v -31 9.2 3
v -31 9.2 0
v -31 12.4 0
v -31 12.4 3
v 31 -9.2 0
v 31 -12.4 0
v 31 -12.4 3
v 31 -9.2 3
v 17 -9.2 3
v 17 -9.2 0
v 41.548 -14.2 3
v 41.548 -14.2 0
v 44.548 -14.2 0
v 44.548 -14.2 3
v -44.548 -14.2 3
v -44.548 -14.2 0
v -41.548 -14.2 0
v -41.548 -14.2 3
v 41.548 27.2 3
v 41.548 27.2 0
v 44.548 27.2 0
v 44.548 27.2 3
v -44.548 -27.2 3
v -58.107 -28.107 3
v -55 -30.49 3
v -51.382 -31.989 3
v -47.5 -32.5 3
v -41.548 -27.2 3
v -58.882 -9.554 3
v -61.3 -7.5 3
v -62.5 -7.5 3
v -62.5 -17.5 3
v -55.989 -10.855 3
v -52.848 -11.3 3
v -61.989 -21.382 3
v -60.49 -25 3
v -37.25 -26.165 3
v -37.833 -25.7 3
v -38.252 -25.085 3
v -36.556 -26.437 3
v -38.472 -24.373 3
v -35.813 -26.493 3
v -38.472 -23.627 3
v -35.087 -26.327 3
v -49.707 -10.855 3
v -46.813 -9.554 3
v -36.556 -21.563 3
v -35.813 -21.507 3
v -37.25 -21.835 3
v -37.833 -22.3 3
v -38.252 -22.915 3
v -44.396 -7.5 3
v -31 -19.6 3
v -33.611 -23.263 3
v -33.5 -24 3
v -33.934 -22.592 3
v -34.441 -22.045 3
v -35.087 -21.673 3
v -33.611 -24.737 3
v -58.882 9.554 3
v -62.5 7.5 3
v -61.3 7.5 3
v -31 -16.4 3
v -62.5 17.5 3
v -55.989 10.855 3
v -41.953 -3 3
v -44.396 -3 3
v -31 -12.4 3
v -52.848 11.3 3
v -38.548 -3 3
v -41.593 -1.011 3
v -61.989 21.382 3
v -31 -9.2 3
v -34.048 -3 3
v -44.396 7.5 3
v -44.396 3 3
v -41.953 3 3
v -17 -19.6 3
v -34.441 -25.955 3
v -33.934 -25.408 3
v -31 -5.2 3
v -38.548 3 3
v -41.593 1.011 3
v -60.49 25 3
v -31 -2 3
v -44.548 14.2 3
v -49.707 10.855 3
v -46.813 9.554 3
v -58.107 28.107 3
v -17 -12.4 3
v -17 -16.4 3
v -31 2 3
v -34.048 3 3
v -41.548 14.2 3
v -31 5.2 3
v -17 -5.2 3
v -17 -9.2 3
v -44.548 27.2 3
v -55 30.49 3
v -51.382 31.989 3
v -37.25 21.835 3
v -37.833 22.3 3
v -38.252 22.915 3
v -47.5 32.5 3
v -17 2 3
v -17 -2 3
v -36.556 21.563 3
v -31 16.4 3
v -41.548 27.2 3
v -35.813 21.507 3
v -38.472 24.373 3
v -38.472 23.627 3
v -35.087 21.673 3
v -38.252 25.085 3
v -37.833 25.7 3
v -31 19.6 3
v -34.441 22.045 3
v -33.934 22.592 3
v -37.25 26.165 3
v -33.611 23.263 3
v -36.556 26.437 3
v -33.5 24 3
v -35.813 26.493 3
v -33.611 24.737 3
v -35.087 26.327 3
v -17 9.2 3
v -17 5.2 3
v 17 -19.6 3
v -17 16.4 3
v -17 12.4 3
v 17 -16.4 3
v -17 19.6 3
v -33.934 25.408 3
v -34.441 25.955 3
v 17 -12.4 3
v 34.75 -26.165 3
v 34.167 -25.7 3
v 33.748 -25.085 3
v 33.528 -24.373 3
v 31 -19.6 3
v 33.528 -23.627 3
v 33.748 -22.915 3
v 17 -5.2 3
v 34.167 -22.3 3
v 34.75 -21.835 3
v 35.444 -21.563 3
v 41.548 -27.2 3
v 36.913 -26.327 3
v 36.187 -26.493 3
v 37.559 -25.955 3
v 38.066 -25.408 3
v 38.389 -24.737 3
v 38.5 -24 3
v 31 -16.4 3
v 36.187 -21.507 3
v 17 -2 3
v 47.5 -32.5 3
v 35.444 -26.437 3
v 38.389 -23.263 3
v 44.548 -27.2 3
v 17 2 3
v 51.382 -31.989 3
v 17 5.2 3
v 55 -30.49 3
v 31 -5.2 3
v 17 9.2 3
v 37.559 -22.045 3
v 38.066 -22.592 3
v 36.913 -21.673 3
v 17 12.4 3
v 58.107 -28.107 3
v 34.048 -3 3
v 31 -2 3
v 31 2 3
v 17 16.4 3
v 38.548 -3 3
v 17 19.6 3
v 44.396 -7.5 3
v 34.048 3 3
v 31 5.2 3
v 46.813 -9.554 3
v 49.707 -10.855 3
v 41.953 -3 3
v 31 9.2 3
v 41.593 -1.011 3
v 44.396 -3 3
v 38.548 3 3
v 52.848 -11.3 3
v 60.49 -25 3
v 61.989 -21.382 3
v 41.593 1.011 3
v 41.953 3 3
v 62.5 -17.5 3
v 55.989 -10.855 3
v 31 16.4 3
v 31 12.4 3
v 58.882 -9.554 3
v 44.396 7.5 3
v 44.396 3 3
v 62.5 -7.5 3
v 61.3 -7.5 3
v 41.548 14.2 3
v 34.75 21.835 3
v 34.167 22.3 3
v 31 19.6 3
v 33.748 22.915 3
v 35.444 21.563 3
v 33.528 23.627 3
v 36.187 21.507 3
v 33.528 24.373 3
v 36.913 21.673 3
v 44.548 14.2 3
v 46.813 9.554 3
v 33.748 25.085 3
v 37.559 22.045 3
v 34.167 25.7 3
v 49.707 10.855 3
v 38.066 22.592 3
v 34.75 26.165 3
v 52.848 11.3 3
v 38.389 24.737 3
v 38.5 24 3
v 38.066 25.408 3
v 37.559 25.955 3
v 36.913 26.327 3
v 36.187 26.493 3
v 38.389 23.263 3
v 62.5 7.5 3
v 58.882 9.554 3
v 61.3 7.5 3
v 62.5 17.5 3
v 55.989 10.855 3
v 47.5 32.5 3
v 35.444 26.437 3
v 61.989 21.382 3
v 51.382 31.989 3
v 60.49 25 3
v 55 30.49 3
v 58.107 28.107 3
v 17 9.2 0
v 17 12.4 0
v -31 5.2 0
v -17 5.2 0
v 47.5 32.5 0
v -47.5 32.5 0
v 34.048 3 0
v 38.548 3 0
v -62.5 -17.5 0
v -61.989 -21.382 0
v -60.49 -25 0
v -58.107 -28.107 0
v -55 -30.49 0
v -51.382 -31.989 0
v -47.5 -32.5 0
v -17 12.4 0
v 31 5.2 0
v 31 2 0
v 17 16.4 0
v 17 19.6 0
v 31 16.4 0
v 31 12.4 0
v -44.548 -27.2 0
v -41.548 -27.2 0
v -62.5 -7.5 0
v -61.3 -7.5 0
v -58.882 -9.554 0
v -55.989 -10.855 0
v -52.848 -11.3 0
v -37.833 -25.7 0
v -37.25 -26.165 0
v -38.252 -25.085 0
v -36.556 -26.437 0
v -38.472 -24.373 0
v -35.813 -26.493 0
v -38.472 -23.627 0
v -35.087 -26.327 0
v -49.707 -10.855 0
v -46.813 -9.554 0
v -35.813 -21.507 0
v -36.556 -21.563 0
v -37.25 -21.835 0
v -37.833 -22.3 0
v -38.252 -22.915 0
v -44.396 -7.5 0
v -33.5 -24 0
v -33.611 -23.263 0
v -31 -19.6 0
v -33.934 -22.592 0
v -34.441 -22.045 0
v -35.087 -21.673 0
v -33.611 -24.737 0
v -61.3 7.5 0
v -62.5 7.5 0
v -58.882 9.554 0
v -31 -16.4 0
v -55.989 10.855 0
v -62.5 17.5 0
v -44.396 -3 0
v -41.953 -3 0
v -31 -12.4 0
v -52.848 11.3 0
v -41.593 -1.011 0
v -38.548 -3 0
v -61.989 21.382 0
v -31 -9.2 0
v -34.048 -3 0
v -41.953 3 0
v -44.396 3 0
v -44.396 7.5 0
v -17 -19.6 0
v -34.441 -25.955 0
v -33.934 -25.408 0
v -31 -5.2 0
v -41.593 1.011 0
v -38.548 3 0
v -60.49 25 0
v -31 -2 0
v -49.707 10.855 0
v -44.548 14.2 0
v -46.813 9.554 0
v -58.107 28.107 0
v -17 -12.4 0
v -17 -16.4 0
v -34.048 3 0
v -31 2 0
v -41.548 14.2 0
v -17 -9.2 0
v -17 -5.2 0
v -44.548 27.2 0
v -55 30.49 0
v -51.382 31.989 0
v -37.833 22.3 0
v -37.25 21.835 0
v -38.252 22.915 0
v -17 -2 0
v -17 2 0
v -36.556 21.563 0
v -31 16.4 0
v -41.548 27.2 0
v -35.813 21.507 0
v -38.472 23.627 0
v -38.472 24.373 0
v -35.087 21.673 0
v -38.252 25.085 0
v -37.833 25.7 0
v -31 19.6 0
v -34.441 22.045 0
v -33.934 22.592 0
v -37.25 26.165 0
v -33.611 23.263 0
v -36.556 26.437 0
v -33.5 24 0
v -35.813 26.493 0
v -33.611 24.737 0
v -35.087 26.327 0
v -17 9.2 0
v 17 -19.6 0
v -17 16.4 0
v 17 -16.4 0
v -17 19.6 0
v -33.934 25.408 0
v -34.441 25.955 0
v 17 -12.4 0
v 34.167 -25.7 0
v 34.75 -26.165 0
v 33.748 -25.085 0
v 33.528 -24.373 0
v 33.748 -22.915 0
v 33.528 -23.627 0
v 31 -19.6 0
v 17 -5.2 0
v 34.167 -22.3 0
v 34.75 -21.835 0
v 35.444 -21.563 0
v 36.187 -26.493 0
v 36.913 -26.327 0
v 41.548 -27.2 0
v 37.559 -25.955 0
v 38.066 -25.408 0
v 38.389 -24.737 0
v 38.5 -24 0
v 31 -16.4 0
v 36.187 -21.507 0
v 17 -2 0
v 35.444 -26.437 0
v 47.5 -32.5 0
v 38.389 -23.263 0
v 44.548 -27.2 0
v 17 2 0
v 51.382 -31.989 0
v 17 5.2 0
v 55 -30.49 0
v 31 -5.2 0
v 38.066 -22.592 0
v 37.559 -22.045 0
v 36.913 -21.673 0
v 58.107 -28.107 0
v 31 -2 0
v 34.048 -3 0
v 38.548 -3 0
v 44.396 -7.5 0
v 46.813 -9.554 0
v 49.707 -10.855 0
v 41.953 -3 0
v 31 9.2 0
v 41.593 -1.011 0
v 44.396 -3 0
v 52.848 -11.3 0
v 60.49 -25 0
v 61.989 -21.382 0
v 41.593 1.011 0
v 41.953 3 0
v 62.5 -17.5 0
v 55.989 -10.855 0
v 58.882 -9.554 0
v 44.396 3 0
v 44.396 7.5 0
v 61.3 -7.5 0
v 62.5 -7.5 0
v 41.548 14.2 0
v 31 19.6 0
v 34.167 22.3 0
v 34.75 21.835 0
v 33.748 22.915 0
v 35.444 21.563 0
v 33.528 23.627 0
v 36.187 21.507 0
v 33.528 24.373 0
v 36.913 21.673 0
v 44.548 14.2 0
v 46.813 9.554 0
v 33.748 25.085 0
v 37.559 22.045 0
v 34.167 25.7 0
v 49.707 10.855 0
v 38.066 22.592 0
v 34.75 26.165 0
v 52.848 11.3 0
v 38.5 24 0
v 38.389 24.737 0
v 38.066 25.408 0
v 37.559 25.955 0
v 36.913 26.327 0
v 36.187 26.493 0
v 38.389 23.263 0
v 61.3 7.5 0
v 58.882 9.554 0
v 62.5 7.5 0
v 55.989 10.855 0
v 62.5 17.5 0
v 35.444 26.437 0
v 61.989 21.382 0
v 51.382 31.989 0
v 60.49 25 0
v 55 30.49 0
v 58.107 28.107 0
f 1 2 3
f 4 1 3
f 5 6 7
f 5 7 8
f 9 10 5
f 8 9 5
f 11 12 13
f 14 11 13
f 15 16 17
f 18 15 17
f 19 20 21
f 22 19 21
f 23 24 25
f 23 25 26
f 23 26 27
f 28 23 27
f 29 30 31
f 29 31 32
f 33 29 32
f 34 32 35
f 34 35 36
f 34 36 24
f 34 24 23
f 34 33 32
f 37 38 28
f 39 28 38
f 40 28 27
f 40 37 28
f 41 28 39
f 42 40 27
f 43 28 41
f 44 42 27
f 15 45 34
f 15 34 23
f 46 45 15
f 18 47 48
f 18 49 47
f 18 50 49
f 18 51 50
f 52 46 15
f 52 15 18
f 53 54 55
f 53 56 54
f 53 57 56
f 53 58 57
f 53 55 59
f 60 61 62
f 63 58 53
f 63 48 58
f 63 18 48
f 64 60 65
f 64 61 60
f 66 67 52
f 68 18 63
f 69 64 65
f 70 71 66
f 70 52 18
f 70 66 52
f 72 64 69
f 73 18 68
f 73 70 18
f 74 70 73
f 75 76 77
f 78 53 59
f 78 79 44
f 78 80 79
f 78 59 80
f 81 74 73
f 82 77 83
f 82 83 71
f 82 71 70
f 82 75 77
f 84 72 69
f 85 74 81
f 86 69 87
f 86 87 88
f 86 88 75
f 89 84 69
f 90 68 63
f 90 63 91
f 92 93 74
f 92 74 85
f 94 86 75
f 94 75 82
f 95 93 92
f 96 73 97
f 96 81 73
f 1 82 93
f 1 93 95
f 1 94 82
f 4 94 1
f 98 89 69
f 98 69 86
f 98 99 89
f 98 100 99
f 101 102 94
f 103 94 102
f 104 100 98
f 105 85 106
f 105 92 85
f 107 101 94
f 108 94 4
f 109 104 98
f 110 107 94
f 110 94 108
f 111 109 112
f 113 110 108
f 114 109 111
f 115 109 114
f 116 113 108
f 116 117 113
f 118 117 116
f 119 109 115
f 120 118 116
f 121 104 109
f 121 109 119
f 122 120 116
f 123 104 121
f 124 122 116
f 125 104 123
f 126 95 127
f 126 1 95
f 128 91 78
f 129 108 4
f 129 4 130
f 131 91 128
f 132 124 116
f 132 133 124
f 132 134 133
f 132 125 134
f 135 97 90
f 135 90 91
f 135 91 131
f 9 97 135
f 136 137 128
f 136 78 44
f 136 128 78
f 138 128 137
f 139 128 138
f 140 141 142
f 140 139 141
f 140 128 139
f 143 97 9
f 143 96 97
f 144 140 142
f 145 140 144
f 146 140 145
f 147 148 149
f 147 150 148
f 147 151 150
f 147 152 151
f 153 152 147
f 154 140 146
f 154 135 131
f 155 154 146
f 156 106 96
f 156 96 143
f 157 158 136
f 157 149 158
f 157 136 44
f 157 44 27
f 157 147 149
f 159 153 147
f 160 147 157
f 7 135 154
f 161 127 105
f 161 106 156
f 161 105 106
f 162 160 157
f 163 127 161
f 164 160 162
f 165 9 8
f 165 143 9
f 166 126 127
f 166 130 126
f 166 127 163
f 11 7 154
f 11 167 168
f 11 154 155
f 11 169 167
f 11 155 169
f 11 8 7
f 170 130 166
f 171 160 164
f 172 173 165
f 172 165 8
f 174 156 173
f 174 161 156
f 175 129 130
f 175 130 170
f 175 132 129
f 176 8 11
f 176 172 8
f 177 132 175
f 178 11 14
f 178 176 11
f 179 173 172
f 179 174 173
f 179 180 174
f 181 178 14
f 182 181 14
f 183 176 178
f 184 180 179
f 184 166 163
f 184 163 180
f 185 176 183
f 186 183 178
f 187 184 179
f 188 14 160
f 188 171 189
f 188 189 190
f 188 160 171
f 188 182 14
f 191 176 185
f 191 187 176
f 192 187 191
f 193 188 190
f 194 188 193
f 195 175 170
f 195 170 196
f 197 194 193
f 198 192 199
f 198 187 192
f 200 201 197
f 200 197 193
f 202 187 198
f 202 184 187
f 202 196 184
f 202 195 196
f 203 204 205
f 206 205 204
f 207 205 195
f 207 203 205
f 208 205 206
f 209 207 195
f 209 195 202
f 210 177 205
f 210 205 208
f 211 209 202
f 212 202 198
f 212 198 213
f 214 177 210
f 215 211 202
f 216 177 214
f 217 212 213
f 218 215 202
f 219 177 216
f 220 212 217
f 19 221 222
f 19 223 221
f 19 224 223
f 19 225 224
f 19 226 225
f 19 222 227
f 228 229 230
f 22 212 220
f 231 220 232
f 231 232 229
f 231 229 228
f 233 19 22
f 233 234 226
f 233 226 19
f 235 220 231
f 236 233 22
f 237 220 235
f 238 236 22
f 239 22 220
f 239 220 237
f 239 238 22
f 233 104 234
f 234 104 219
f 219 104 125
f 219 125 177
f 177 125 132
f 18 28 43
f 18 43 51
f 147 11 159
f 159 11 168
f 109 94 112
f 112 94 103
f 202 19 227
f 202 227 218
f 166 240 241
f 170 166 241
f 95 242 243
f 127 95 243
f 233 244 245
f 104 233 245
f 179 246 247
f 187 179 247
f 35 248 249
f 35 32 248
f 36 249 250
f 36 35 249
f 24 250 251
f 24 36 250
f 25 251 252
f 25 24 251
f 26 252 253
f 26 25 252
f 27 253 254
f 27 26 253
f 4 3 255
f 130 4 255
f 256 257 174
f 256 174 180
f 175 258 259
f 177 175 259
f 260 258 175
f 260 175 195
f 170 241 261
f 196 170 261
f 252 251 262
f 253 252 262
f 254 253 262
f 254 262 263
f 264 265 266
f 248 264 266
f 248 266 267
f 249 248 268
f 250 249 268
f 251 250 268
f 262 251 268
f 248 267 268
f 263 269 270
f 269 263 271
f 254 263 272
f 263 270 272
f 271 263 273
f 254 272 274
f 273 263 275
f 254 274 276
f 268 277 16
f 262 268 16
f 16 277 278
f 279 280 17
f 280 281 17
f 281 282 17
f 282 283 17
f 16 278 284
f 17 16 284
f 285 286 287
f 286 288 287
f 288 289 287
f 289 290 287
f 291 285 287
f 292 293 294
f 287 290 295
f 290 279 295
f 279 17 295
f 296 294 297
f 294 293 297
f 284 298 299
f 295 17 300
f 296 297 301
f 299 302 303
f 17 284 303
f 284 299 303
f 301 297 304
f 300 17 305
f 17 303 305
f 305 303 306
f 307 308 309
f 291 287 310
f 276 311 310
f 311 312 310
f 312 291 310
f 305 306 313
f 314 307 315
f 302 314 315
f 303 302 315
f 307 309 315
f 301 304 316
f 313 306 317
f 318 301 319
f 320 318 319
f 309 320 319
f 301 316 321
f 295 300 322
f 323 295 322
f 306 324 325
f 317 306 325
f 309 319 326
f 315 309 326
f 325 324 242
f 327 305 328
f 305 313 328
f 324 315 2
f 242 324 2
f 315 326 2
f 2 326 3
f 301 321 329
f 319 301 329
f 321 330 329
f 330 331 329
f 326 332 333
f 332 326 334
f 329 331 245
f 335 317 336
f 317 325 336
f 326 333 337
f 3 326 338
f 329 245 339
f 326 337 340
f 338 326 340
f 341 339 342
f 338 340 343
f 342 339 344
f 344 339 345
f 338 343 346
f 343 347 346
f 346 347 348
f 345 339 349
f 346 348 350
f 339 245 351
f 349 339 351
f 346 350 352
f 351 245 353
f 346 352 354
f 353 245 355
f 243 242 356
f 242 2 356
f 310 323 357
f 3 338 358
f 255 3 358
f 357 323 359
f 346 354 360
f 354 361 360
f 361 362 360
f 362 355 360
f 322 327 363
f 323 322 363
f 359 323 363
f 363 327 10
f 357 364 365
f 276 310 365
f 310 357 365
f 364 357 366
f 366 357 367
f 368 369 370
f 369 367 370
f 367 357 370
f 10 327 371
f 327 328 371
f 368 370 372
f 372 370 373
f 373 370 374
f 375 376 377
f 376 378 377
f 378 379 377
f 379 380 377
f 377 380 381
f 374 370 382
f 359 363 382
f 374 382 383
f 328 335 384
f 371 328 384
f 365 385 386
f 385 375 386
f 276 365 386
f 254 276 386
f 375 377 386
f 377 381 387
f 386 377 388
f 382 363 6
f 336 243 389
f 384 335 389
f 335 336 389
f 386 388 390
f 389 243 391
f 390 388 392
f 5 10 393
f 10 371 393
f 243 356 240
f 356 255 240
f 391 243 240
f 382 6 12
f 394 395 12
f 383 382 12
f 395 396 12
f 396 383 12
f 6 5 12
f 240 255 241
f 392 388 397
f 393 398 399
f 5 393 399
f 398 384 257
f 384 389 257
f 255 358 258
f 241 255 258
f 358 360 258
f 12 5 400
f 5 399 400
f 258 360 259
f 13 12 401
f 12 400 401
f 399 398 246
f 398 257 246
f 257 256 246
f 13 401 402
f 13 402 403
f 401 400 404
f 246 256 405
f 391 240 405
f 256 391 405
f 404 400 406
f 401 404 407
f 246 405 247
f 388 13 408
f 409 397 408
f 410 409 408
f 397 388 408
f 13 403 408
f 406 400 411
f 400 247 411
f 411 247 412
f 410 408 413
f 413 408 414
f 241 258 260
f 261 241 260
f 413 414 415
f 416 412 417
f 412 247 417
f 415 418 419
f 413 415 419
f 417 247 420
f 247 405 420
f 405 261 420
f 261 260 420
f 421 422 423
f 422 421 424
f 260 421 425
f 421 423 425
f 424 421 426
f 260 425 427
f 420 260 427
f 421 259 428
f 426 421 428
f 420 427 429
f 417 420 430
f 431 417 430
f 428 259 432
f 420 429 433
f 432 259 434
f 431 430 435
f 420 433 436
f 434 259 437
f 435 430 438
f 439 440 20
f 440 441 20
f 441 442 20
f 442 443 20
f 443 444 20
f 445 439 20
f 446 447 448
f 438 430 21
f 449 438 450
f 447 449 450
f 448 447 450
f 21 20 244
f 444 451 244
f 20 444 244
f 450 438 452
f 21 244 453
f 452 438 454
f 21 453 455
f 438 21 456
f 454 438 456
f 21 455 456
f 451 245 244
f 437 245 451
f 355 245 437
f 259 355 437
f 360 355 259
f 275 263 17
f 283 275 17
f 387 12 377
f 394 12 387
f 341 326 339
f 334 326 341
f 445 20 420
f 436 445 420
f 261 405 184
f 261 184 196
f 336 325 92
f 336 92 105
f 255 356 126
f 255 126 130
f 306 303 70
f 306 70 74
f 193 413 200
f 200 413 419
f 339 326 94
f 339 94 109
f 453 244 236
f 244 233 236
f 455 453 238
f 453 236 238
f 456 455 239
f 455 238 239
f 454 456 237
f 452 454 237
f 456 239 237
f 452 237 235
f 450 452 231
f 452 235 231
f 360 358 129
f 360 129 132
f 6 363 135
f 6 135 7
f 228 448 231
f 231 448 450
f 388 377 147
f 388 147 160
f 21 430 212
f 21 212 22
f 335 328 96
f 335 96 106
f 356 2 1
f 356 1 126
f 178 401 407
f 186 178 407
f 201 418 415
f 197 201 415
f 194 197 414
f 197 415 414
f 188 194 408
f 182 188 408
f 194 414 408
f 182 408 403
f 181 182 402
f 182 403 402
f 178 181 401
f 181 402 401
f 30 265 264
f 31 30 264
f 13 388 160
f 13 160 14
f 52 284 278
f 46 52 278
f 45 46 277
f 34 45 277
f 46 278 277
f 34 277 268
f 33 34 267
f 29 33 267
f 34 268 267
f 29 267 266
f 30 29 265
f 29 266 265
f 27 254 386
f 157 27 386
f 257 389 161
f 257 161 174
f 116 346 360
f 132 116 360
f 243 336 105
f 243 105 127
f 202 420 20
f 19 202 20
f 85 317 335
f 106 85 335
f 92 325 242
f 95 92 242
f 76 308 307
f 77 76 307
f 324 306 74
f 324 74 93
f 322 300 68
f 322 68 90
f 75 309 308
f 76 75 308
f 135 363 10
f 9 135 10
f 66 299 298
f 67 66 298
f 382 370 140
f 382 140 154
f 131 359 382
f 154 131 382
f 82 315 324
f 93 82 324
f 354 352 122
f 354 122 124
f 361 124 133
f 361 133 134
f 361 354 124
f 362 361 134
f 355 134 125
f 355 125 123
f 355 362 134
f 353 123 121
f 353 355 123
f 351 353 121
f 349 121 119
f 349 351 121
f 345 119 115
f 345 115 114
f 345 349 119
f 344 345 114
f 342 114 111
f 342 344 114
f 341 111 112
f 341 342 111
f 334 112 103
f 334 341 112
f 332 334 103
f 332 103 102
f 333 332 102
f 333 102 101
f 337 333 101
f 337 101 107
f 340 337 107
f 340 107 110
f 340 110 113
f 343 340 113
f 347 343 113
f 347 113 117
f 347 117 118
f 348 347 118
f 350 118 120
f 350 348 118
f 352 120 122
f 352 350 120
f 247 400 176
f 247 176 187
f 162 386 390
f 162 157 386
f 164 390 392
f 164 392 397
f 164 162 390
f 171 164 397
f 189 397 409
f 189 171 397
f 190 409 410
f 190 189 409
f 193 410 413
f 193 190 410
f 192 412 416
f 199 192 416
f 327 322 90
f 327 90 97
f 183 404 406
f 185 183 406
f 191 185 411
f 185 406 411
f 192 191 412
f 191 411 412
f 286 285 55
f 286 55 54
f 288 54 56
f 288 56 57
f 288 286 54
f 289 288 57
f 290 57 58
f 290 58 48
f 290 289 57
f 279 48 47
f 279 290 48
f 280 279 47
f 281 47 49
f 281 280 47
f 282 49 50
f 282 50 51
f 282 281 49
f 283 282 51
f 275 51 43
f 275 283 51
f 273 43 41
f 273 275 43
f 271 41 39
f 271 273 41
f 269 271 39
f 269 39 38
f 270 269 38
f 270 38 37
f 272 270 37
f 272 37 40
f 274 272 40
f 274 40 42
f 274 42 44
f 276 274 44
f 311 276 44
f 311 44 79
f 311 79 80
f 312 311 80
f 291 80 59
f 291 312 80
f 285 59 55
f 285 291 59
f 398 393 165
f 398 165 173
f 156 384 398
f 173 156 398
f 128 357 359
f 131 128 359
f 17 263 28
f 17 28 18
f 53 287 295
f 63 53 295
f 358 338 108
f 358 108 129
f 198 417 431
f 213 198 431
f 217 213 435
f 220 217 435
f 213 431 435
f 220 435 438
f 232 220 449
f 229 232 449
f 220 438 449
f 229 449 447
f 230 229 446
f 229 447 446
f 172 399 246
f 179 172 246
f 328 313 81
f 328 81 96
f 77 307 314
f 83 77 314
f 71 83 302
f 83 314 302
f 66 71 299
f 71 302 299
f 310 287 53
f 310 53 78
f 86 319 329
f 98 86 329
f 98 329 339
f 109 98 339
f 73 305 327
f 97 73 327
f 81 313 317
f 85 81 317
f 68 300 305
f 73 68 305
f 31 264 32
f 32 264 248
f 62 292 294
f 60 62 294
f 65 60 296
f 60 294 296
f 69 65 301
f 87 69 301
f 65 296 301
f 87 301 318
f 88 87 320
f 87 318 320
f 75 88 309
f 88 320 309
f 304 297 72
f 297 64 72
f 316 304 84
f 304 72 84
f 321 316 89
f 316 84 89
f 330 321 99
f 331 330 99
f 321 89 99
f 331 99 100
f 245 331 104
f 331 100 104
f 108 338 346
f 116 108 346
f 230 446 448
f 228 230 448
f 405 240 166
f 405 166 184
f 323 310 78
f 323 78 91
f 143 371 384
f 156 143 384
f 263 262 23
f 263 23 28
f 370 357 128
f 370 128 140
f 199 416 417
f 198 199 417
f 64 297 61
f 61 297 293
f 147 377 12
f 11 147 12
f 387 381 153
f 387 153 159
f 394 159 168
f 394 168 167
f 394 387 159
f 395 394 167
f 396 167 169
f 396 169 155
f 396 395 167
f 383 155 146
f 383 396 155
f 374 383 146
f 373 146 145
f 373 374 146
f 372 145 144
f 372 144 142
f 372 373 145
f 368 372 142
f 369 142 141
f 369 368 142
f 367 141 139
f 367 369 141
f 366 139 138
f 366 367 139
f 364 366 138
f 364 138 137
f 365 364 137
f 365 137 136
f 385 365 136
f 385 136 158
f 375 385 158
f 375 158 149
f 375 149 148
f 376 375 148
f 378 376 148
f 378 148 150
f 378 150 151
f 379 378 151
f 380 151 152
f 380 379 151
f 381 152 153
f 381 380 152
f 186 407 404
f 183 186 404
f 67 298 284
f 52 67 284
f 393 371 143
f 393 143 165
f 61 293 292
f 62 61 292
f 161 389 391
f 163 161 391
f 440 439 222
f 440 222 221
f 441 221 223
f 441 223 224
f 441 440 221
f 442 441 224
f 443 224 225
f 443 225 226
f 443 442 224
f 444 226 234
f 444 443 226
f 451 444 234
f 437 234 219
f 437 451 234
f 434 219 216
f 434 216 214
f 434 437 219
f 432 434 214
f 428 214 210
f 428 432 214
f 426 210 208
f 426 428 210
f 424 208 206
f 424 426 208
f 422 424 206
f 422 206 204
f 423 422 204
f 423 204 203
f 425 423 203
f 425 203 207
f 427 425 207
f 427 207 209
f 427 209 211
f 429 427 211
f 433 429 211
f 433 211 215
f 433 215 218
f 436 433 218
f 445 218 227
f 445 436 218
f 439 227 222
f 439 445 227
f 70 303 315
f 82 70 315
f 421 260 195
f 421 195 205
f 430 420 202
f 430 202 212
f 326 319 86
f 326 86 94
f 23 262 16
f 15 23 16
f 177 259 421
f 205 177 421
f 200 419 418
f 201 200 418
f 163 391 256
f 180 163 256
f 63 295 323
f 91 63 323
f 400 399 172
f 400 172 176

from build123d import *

# Parameters (mm, degrees)
SKICA2_R                = 2.5
SKICA2_W                = 4.5
SKICA2_H                = 6
SKICA2_W_2              = 3
SKICA2_H_2              = 13
SKICA2_W_3              = 14
SKICA2_H_3              = 3.2
P_IDAT_VYSUNUT_M1_DEPTH = 3
ZAOBLIT1_R              = 15


with BuildPart() as part:
    # Skica2 → Přidat vysunutím1 (new body)
    with BuildSketch(Plane.XY):
        with BuildLine():
            Line((-62.5, 7.5), (-61.3, 7.5))
            ThreePointArc((-61.3, 7.5), (-52.847781356, 11.3), (-44.395562713, 7.5))
            Line((-44.395562713, 7.5), (-44.395562713, 3))
            Line((-44.395562713, 3), (-41.953287334, 3))
            ThreePointArc((-41.953287334, 3), (-41.547781356, 0), (-41.953287334, -3))
            Line((-41.953287334, -3), (-44.395562713, -3))
            Line((-44.395562713, -3), (-44.395562713, -7.5))
            ThreePointArc((-44.395562713, -7.5), (-52.847781356, -11.3), (-61.3, -7.5))
            Line((-61.3, -7.5), (-62.5, -7.5))
            Line((-62.5, -7.5), (-62.5, -32.5))
            Line((-62.5, -32.5), (62.5, -32.5))
            Line((62.5, -32.5), (62.5, -7.5))
            Line((62.5, -7.5), (61.3, -7.5))
            ThreePointArc((61.3, -7.5), (52.847781356, -11.3), (44.395562713, -7.5))
            Line((44.395562713, -7.5), (44.395562713, -3))
            Line((44.395562713, -3), (41.953287334, -3))
            ThreePointArc((41.953287334, -3), (41.547781356, 0), (41.953287334, 3))
            Line((41.953287334, 3), (44.395562713, 3))
            Line((44.395562713, 3), (44.395562713, 7.5))
            ThreePointArc((44.395562713, 7.5), (52.847781356, 11.3), (61.3, 7.5))
            Line((61.3, 7.5), (62.5, 7.5))
            Line((62.5, 7.5), (62.5, 32.5))
            Line((62.5, 32.5), (-62.5, 32.5))
            Line((-62.5, 32.5), (-62.5, 7.5))
        make_face()
        with Locations((-36, 24)):
            Circle(SKICA2_R, mode=Mode.SUBTRACT)
        with Locations((36, 24)):
            Circle(SKICA2_R, mode=Mode.SUBTRACT)
        with Locations((-36, -24)):
            Circle(SKICA2_R, mode=Mode.SUBTRACT)
        with Locations((36, -24)):
            Circle(SKICA2_R, mode=Mode.SUBTRACT)
        with Locations((-36.297781356, 0)):
            Rectangle(SKICA2_W, SKICA2_H, mode=Mode.SUBTRACT)
        with Locations((-43.047781356, -20.7)):
            Rectangle(SKICA2_W_2, SKICA2_H_2, mode=Mode.SUBTRACT)
        with Locations((-43.047781356, 20.7)):
            Rectangle(SKICA2_W_2, SKICA2_H_2, mode=Mode.SUBTRACT)
        with Locations((43.047781356, -20.7)):
            Rectangle(SKICA2_W_2, SKICA2_H_2, mode=Mode.SUBTRACT)
        with Locations((43.047781356, 20.7)):
            Rectangle(SKICA2_W_2, SKICA2_H_2, mode=Mode.SUBTRACT)
        with Locations((36.297781356, 0)):
            Rectangle(SKICA2_W, SKICA2_H, mode=Mode.SUBTRACT)
        with Locations((-24, 18)):
            Rectangle(SKICA2_W_3, SKICA2_H_3, mode=Mode.SUBTRACT)
        with Locations((-24, 10.8)):
            Rectangle(SKICA2_W_3, SKICA2_H_3, mode=Mode.SUBTRACT)
        with Locations((-24, 3.6)):
            Rectangle(SKICA2_W_3, SKICA2_H_3, mode=Mode.SUBTRACT)
        with Locations((-24, -3.6)):
            Rectangle(SKICA2_W_3, SKICA2_H_3, mode=Mode.SUBTRACT)
        with Locations((-24, -10.8)):
            Rectangle(SKICA2_W_3, SKICA2_H_3, mode=Mode.SUBTRACT)
        with Locations((-24, -18)):
            Rectangle(SKICA2_W_3, SKICA2_H_3, mode=Mode.SUBTRACT)
        with Locations((24, -18)):
            Rectangle(SKICA2_W_3, SKICA2_H_3, mode=Mode.SUBTRACT)
        with Locations((24, -10.8)):
            Rectangle(SKICA2_W_3, SKICA2_H_3, mode=Mode.SUBTRACT)
        with Locations((24, -3.6)):
            Rectangle(SKICA2_W_3, SKICA2_H_3, mode=Mode.SUBTRACT)
        with Locations((24, 3.6)):
            Rectangle(SKICA2_W_3, SKICA2_H_3, mode=Mode.SUBTRACT)
        with Locations((24, 10.8)):
            Rectangle(SKICA2_W_3, SKICA2_H_3, mode=Mode.SUBTRACT)
        with Locations((24, 18)):
            Rectangle(SKICA2_W_3, SKICA2_H_3, mode=Mode.SUBTRACT)
    extrude(amount=P_IDAT_VYSUNUT_M1_DEPTH)

    # Zaoblit1
    zaoblit1_edges = [part.edges().sort_by_distance(p)[0] for p in [
        (-62.5, 32.5, 1.5),
        (62.5, 32.5, 1.5),
        (62.5, -32.5, 1.5),
        (-62.5, -32.5, 1.5),
    ]]
    fillet(zaoblit1_edges, radius=ZAOBLIT1_R)


solid = part.part
